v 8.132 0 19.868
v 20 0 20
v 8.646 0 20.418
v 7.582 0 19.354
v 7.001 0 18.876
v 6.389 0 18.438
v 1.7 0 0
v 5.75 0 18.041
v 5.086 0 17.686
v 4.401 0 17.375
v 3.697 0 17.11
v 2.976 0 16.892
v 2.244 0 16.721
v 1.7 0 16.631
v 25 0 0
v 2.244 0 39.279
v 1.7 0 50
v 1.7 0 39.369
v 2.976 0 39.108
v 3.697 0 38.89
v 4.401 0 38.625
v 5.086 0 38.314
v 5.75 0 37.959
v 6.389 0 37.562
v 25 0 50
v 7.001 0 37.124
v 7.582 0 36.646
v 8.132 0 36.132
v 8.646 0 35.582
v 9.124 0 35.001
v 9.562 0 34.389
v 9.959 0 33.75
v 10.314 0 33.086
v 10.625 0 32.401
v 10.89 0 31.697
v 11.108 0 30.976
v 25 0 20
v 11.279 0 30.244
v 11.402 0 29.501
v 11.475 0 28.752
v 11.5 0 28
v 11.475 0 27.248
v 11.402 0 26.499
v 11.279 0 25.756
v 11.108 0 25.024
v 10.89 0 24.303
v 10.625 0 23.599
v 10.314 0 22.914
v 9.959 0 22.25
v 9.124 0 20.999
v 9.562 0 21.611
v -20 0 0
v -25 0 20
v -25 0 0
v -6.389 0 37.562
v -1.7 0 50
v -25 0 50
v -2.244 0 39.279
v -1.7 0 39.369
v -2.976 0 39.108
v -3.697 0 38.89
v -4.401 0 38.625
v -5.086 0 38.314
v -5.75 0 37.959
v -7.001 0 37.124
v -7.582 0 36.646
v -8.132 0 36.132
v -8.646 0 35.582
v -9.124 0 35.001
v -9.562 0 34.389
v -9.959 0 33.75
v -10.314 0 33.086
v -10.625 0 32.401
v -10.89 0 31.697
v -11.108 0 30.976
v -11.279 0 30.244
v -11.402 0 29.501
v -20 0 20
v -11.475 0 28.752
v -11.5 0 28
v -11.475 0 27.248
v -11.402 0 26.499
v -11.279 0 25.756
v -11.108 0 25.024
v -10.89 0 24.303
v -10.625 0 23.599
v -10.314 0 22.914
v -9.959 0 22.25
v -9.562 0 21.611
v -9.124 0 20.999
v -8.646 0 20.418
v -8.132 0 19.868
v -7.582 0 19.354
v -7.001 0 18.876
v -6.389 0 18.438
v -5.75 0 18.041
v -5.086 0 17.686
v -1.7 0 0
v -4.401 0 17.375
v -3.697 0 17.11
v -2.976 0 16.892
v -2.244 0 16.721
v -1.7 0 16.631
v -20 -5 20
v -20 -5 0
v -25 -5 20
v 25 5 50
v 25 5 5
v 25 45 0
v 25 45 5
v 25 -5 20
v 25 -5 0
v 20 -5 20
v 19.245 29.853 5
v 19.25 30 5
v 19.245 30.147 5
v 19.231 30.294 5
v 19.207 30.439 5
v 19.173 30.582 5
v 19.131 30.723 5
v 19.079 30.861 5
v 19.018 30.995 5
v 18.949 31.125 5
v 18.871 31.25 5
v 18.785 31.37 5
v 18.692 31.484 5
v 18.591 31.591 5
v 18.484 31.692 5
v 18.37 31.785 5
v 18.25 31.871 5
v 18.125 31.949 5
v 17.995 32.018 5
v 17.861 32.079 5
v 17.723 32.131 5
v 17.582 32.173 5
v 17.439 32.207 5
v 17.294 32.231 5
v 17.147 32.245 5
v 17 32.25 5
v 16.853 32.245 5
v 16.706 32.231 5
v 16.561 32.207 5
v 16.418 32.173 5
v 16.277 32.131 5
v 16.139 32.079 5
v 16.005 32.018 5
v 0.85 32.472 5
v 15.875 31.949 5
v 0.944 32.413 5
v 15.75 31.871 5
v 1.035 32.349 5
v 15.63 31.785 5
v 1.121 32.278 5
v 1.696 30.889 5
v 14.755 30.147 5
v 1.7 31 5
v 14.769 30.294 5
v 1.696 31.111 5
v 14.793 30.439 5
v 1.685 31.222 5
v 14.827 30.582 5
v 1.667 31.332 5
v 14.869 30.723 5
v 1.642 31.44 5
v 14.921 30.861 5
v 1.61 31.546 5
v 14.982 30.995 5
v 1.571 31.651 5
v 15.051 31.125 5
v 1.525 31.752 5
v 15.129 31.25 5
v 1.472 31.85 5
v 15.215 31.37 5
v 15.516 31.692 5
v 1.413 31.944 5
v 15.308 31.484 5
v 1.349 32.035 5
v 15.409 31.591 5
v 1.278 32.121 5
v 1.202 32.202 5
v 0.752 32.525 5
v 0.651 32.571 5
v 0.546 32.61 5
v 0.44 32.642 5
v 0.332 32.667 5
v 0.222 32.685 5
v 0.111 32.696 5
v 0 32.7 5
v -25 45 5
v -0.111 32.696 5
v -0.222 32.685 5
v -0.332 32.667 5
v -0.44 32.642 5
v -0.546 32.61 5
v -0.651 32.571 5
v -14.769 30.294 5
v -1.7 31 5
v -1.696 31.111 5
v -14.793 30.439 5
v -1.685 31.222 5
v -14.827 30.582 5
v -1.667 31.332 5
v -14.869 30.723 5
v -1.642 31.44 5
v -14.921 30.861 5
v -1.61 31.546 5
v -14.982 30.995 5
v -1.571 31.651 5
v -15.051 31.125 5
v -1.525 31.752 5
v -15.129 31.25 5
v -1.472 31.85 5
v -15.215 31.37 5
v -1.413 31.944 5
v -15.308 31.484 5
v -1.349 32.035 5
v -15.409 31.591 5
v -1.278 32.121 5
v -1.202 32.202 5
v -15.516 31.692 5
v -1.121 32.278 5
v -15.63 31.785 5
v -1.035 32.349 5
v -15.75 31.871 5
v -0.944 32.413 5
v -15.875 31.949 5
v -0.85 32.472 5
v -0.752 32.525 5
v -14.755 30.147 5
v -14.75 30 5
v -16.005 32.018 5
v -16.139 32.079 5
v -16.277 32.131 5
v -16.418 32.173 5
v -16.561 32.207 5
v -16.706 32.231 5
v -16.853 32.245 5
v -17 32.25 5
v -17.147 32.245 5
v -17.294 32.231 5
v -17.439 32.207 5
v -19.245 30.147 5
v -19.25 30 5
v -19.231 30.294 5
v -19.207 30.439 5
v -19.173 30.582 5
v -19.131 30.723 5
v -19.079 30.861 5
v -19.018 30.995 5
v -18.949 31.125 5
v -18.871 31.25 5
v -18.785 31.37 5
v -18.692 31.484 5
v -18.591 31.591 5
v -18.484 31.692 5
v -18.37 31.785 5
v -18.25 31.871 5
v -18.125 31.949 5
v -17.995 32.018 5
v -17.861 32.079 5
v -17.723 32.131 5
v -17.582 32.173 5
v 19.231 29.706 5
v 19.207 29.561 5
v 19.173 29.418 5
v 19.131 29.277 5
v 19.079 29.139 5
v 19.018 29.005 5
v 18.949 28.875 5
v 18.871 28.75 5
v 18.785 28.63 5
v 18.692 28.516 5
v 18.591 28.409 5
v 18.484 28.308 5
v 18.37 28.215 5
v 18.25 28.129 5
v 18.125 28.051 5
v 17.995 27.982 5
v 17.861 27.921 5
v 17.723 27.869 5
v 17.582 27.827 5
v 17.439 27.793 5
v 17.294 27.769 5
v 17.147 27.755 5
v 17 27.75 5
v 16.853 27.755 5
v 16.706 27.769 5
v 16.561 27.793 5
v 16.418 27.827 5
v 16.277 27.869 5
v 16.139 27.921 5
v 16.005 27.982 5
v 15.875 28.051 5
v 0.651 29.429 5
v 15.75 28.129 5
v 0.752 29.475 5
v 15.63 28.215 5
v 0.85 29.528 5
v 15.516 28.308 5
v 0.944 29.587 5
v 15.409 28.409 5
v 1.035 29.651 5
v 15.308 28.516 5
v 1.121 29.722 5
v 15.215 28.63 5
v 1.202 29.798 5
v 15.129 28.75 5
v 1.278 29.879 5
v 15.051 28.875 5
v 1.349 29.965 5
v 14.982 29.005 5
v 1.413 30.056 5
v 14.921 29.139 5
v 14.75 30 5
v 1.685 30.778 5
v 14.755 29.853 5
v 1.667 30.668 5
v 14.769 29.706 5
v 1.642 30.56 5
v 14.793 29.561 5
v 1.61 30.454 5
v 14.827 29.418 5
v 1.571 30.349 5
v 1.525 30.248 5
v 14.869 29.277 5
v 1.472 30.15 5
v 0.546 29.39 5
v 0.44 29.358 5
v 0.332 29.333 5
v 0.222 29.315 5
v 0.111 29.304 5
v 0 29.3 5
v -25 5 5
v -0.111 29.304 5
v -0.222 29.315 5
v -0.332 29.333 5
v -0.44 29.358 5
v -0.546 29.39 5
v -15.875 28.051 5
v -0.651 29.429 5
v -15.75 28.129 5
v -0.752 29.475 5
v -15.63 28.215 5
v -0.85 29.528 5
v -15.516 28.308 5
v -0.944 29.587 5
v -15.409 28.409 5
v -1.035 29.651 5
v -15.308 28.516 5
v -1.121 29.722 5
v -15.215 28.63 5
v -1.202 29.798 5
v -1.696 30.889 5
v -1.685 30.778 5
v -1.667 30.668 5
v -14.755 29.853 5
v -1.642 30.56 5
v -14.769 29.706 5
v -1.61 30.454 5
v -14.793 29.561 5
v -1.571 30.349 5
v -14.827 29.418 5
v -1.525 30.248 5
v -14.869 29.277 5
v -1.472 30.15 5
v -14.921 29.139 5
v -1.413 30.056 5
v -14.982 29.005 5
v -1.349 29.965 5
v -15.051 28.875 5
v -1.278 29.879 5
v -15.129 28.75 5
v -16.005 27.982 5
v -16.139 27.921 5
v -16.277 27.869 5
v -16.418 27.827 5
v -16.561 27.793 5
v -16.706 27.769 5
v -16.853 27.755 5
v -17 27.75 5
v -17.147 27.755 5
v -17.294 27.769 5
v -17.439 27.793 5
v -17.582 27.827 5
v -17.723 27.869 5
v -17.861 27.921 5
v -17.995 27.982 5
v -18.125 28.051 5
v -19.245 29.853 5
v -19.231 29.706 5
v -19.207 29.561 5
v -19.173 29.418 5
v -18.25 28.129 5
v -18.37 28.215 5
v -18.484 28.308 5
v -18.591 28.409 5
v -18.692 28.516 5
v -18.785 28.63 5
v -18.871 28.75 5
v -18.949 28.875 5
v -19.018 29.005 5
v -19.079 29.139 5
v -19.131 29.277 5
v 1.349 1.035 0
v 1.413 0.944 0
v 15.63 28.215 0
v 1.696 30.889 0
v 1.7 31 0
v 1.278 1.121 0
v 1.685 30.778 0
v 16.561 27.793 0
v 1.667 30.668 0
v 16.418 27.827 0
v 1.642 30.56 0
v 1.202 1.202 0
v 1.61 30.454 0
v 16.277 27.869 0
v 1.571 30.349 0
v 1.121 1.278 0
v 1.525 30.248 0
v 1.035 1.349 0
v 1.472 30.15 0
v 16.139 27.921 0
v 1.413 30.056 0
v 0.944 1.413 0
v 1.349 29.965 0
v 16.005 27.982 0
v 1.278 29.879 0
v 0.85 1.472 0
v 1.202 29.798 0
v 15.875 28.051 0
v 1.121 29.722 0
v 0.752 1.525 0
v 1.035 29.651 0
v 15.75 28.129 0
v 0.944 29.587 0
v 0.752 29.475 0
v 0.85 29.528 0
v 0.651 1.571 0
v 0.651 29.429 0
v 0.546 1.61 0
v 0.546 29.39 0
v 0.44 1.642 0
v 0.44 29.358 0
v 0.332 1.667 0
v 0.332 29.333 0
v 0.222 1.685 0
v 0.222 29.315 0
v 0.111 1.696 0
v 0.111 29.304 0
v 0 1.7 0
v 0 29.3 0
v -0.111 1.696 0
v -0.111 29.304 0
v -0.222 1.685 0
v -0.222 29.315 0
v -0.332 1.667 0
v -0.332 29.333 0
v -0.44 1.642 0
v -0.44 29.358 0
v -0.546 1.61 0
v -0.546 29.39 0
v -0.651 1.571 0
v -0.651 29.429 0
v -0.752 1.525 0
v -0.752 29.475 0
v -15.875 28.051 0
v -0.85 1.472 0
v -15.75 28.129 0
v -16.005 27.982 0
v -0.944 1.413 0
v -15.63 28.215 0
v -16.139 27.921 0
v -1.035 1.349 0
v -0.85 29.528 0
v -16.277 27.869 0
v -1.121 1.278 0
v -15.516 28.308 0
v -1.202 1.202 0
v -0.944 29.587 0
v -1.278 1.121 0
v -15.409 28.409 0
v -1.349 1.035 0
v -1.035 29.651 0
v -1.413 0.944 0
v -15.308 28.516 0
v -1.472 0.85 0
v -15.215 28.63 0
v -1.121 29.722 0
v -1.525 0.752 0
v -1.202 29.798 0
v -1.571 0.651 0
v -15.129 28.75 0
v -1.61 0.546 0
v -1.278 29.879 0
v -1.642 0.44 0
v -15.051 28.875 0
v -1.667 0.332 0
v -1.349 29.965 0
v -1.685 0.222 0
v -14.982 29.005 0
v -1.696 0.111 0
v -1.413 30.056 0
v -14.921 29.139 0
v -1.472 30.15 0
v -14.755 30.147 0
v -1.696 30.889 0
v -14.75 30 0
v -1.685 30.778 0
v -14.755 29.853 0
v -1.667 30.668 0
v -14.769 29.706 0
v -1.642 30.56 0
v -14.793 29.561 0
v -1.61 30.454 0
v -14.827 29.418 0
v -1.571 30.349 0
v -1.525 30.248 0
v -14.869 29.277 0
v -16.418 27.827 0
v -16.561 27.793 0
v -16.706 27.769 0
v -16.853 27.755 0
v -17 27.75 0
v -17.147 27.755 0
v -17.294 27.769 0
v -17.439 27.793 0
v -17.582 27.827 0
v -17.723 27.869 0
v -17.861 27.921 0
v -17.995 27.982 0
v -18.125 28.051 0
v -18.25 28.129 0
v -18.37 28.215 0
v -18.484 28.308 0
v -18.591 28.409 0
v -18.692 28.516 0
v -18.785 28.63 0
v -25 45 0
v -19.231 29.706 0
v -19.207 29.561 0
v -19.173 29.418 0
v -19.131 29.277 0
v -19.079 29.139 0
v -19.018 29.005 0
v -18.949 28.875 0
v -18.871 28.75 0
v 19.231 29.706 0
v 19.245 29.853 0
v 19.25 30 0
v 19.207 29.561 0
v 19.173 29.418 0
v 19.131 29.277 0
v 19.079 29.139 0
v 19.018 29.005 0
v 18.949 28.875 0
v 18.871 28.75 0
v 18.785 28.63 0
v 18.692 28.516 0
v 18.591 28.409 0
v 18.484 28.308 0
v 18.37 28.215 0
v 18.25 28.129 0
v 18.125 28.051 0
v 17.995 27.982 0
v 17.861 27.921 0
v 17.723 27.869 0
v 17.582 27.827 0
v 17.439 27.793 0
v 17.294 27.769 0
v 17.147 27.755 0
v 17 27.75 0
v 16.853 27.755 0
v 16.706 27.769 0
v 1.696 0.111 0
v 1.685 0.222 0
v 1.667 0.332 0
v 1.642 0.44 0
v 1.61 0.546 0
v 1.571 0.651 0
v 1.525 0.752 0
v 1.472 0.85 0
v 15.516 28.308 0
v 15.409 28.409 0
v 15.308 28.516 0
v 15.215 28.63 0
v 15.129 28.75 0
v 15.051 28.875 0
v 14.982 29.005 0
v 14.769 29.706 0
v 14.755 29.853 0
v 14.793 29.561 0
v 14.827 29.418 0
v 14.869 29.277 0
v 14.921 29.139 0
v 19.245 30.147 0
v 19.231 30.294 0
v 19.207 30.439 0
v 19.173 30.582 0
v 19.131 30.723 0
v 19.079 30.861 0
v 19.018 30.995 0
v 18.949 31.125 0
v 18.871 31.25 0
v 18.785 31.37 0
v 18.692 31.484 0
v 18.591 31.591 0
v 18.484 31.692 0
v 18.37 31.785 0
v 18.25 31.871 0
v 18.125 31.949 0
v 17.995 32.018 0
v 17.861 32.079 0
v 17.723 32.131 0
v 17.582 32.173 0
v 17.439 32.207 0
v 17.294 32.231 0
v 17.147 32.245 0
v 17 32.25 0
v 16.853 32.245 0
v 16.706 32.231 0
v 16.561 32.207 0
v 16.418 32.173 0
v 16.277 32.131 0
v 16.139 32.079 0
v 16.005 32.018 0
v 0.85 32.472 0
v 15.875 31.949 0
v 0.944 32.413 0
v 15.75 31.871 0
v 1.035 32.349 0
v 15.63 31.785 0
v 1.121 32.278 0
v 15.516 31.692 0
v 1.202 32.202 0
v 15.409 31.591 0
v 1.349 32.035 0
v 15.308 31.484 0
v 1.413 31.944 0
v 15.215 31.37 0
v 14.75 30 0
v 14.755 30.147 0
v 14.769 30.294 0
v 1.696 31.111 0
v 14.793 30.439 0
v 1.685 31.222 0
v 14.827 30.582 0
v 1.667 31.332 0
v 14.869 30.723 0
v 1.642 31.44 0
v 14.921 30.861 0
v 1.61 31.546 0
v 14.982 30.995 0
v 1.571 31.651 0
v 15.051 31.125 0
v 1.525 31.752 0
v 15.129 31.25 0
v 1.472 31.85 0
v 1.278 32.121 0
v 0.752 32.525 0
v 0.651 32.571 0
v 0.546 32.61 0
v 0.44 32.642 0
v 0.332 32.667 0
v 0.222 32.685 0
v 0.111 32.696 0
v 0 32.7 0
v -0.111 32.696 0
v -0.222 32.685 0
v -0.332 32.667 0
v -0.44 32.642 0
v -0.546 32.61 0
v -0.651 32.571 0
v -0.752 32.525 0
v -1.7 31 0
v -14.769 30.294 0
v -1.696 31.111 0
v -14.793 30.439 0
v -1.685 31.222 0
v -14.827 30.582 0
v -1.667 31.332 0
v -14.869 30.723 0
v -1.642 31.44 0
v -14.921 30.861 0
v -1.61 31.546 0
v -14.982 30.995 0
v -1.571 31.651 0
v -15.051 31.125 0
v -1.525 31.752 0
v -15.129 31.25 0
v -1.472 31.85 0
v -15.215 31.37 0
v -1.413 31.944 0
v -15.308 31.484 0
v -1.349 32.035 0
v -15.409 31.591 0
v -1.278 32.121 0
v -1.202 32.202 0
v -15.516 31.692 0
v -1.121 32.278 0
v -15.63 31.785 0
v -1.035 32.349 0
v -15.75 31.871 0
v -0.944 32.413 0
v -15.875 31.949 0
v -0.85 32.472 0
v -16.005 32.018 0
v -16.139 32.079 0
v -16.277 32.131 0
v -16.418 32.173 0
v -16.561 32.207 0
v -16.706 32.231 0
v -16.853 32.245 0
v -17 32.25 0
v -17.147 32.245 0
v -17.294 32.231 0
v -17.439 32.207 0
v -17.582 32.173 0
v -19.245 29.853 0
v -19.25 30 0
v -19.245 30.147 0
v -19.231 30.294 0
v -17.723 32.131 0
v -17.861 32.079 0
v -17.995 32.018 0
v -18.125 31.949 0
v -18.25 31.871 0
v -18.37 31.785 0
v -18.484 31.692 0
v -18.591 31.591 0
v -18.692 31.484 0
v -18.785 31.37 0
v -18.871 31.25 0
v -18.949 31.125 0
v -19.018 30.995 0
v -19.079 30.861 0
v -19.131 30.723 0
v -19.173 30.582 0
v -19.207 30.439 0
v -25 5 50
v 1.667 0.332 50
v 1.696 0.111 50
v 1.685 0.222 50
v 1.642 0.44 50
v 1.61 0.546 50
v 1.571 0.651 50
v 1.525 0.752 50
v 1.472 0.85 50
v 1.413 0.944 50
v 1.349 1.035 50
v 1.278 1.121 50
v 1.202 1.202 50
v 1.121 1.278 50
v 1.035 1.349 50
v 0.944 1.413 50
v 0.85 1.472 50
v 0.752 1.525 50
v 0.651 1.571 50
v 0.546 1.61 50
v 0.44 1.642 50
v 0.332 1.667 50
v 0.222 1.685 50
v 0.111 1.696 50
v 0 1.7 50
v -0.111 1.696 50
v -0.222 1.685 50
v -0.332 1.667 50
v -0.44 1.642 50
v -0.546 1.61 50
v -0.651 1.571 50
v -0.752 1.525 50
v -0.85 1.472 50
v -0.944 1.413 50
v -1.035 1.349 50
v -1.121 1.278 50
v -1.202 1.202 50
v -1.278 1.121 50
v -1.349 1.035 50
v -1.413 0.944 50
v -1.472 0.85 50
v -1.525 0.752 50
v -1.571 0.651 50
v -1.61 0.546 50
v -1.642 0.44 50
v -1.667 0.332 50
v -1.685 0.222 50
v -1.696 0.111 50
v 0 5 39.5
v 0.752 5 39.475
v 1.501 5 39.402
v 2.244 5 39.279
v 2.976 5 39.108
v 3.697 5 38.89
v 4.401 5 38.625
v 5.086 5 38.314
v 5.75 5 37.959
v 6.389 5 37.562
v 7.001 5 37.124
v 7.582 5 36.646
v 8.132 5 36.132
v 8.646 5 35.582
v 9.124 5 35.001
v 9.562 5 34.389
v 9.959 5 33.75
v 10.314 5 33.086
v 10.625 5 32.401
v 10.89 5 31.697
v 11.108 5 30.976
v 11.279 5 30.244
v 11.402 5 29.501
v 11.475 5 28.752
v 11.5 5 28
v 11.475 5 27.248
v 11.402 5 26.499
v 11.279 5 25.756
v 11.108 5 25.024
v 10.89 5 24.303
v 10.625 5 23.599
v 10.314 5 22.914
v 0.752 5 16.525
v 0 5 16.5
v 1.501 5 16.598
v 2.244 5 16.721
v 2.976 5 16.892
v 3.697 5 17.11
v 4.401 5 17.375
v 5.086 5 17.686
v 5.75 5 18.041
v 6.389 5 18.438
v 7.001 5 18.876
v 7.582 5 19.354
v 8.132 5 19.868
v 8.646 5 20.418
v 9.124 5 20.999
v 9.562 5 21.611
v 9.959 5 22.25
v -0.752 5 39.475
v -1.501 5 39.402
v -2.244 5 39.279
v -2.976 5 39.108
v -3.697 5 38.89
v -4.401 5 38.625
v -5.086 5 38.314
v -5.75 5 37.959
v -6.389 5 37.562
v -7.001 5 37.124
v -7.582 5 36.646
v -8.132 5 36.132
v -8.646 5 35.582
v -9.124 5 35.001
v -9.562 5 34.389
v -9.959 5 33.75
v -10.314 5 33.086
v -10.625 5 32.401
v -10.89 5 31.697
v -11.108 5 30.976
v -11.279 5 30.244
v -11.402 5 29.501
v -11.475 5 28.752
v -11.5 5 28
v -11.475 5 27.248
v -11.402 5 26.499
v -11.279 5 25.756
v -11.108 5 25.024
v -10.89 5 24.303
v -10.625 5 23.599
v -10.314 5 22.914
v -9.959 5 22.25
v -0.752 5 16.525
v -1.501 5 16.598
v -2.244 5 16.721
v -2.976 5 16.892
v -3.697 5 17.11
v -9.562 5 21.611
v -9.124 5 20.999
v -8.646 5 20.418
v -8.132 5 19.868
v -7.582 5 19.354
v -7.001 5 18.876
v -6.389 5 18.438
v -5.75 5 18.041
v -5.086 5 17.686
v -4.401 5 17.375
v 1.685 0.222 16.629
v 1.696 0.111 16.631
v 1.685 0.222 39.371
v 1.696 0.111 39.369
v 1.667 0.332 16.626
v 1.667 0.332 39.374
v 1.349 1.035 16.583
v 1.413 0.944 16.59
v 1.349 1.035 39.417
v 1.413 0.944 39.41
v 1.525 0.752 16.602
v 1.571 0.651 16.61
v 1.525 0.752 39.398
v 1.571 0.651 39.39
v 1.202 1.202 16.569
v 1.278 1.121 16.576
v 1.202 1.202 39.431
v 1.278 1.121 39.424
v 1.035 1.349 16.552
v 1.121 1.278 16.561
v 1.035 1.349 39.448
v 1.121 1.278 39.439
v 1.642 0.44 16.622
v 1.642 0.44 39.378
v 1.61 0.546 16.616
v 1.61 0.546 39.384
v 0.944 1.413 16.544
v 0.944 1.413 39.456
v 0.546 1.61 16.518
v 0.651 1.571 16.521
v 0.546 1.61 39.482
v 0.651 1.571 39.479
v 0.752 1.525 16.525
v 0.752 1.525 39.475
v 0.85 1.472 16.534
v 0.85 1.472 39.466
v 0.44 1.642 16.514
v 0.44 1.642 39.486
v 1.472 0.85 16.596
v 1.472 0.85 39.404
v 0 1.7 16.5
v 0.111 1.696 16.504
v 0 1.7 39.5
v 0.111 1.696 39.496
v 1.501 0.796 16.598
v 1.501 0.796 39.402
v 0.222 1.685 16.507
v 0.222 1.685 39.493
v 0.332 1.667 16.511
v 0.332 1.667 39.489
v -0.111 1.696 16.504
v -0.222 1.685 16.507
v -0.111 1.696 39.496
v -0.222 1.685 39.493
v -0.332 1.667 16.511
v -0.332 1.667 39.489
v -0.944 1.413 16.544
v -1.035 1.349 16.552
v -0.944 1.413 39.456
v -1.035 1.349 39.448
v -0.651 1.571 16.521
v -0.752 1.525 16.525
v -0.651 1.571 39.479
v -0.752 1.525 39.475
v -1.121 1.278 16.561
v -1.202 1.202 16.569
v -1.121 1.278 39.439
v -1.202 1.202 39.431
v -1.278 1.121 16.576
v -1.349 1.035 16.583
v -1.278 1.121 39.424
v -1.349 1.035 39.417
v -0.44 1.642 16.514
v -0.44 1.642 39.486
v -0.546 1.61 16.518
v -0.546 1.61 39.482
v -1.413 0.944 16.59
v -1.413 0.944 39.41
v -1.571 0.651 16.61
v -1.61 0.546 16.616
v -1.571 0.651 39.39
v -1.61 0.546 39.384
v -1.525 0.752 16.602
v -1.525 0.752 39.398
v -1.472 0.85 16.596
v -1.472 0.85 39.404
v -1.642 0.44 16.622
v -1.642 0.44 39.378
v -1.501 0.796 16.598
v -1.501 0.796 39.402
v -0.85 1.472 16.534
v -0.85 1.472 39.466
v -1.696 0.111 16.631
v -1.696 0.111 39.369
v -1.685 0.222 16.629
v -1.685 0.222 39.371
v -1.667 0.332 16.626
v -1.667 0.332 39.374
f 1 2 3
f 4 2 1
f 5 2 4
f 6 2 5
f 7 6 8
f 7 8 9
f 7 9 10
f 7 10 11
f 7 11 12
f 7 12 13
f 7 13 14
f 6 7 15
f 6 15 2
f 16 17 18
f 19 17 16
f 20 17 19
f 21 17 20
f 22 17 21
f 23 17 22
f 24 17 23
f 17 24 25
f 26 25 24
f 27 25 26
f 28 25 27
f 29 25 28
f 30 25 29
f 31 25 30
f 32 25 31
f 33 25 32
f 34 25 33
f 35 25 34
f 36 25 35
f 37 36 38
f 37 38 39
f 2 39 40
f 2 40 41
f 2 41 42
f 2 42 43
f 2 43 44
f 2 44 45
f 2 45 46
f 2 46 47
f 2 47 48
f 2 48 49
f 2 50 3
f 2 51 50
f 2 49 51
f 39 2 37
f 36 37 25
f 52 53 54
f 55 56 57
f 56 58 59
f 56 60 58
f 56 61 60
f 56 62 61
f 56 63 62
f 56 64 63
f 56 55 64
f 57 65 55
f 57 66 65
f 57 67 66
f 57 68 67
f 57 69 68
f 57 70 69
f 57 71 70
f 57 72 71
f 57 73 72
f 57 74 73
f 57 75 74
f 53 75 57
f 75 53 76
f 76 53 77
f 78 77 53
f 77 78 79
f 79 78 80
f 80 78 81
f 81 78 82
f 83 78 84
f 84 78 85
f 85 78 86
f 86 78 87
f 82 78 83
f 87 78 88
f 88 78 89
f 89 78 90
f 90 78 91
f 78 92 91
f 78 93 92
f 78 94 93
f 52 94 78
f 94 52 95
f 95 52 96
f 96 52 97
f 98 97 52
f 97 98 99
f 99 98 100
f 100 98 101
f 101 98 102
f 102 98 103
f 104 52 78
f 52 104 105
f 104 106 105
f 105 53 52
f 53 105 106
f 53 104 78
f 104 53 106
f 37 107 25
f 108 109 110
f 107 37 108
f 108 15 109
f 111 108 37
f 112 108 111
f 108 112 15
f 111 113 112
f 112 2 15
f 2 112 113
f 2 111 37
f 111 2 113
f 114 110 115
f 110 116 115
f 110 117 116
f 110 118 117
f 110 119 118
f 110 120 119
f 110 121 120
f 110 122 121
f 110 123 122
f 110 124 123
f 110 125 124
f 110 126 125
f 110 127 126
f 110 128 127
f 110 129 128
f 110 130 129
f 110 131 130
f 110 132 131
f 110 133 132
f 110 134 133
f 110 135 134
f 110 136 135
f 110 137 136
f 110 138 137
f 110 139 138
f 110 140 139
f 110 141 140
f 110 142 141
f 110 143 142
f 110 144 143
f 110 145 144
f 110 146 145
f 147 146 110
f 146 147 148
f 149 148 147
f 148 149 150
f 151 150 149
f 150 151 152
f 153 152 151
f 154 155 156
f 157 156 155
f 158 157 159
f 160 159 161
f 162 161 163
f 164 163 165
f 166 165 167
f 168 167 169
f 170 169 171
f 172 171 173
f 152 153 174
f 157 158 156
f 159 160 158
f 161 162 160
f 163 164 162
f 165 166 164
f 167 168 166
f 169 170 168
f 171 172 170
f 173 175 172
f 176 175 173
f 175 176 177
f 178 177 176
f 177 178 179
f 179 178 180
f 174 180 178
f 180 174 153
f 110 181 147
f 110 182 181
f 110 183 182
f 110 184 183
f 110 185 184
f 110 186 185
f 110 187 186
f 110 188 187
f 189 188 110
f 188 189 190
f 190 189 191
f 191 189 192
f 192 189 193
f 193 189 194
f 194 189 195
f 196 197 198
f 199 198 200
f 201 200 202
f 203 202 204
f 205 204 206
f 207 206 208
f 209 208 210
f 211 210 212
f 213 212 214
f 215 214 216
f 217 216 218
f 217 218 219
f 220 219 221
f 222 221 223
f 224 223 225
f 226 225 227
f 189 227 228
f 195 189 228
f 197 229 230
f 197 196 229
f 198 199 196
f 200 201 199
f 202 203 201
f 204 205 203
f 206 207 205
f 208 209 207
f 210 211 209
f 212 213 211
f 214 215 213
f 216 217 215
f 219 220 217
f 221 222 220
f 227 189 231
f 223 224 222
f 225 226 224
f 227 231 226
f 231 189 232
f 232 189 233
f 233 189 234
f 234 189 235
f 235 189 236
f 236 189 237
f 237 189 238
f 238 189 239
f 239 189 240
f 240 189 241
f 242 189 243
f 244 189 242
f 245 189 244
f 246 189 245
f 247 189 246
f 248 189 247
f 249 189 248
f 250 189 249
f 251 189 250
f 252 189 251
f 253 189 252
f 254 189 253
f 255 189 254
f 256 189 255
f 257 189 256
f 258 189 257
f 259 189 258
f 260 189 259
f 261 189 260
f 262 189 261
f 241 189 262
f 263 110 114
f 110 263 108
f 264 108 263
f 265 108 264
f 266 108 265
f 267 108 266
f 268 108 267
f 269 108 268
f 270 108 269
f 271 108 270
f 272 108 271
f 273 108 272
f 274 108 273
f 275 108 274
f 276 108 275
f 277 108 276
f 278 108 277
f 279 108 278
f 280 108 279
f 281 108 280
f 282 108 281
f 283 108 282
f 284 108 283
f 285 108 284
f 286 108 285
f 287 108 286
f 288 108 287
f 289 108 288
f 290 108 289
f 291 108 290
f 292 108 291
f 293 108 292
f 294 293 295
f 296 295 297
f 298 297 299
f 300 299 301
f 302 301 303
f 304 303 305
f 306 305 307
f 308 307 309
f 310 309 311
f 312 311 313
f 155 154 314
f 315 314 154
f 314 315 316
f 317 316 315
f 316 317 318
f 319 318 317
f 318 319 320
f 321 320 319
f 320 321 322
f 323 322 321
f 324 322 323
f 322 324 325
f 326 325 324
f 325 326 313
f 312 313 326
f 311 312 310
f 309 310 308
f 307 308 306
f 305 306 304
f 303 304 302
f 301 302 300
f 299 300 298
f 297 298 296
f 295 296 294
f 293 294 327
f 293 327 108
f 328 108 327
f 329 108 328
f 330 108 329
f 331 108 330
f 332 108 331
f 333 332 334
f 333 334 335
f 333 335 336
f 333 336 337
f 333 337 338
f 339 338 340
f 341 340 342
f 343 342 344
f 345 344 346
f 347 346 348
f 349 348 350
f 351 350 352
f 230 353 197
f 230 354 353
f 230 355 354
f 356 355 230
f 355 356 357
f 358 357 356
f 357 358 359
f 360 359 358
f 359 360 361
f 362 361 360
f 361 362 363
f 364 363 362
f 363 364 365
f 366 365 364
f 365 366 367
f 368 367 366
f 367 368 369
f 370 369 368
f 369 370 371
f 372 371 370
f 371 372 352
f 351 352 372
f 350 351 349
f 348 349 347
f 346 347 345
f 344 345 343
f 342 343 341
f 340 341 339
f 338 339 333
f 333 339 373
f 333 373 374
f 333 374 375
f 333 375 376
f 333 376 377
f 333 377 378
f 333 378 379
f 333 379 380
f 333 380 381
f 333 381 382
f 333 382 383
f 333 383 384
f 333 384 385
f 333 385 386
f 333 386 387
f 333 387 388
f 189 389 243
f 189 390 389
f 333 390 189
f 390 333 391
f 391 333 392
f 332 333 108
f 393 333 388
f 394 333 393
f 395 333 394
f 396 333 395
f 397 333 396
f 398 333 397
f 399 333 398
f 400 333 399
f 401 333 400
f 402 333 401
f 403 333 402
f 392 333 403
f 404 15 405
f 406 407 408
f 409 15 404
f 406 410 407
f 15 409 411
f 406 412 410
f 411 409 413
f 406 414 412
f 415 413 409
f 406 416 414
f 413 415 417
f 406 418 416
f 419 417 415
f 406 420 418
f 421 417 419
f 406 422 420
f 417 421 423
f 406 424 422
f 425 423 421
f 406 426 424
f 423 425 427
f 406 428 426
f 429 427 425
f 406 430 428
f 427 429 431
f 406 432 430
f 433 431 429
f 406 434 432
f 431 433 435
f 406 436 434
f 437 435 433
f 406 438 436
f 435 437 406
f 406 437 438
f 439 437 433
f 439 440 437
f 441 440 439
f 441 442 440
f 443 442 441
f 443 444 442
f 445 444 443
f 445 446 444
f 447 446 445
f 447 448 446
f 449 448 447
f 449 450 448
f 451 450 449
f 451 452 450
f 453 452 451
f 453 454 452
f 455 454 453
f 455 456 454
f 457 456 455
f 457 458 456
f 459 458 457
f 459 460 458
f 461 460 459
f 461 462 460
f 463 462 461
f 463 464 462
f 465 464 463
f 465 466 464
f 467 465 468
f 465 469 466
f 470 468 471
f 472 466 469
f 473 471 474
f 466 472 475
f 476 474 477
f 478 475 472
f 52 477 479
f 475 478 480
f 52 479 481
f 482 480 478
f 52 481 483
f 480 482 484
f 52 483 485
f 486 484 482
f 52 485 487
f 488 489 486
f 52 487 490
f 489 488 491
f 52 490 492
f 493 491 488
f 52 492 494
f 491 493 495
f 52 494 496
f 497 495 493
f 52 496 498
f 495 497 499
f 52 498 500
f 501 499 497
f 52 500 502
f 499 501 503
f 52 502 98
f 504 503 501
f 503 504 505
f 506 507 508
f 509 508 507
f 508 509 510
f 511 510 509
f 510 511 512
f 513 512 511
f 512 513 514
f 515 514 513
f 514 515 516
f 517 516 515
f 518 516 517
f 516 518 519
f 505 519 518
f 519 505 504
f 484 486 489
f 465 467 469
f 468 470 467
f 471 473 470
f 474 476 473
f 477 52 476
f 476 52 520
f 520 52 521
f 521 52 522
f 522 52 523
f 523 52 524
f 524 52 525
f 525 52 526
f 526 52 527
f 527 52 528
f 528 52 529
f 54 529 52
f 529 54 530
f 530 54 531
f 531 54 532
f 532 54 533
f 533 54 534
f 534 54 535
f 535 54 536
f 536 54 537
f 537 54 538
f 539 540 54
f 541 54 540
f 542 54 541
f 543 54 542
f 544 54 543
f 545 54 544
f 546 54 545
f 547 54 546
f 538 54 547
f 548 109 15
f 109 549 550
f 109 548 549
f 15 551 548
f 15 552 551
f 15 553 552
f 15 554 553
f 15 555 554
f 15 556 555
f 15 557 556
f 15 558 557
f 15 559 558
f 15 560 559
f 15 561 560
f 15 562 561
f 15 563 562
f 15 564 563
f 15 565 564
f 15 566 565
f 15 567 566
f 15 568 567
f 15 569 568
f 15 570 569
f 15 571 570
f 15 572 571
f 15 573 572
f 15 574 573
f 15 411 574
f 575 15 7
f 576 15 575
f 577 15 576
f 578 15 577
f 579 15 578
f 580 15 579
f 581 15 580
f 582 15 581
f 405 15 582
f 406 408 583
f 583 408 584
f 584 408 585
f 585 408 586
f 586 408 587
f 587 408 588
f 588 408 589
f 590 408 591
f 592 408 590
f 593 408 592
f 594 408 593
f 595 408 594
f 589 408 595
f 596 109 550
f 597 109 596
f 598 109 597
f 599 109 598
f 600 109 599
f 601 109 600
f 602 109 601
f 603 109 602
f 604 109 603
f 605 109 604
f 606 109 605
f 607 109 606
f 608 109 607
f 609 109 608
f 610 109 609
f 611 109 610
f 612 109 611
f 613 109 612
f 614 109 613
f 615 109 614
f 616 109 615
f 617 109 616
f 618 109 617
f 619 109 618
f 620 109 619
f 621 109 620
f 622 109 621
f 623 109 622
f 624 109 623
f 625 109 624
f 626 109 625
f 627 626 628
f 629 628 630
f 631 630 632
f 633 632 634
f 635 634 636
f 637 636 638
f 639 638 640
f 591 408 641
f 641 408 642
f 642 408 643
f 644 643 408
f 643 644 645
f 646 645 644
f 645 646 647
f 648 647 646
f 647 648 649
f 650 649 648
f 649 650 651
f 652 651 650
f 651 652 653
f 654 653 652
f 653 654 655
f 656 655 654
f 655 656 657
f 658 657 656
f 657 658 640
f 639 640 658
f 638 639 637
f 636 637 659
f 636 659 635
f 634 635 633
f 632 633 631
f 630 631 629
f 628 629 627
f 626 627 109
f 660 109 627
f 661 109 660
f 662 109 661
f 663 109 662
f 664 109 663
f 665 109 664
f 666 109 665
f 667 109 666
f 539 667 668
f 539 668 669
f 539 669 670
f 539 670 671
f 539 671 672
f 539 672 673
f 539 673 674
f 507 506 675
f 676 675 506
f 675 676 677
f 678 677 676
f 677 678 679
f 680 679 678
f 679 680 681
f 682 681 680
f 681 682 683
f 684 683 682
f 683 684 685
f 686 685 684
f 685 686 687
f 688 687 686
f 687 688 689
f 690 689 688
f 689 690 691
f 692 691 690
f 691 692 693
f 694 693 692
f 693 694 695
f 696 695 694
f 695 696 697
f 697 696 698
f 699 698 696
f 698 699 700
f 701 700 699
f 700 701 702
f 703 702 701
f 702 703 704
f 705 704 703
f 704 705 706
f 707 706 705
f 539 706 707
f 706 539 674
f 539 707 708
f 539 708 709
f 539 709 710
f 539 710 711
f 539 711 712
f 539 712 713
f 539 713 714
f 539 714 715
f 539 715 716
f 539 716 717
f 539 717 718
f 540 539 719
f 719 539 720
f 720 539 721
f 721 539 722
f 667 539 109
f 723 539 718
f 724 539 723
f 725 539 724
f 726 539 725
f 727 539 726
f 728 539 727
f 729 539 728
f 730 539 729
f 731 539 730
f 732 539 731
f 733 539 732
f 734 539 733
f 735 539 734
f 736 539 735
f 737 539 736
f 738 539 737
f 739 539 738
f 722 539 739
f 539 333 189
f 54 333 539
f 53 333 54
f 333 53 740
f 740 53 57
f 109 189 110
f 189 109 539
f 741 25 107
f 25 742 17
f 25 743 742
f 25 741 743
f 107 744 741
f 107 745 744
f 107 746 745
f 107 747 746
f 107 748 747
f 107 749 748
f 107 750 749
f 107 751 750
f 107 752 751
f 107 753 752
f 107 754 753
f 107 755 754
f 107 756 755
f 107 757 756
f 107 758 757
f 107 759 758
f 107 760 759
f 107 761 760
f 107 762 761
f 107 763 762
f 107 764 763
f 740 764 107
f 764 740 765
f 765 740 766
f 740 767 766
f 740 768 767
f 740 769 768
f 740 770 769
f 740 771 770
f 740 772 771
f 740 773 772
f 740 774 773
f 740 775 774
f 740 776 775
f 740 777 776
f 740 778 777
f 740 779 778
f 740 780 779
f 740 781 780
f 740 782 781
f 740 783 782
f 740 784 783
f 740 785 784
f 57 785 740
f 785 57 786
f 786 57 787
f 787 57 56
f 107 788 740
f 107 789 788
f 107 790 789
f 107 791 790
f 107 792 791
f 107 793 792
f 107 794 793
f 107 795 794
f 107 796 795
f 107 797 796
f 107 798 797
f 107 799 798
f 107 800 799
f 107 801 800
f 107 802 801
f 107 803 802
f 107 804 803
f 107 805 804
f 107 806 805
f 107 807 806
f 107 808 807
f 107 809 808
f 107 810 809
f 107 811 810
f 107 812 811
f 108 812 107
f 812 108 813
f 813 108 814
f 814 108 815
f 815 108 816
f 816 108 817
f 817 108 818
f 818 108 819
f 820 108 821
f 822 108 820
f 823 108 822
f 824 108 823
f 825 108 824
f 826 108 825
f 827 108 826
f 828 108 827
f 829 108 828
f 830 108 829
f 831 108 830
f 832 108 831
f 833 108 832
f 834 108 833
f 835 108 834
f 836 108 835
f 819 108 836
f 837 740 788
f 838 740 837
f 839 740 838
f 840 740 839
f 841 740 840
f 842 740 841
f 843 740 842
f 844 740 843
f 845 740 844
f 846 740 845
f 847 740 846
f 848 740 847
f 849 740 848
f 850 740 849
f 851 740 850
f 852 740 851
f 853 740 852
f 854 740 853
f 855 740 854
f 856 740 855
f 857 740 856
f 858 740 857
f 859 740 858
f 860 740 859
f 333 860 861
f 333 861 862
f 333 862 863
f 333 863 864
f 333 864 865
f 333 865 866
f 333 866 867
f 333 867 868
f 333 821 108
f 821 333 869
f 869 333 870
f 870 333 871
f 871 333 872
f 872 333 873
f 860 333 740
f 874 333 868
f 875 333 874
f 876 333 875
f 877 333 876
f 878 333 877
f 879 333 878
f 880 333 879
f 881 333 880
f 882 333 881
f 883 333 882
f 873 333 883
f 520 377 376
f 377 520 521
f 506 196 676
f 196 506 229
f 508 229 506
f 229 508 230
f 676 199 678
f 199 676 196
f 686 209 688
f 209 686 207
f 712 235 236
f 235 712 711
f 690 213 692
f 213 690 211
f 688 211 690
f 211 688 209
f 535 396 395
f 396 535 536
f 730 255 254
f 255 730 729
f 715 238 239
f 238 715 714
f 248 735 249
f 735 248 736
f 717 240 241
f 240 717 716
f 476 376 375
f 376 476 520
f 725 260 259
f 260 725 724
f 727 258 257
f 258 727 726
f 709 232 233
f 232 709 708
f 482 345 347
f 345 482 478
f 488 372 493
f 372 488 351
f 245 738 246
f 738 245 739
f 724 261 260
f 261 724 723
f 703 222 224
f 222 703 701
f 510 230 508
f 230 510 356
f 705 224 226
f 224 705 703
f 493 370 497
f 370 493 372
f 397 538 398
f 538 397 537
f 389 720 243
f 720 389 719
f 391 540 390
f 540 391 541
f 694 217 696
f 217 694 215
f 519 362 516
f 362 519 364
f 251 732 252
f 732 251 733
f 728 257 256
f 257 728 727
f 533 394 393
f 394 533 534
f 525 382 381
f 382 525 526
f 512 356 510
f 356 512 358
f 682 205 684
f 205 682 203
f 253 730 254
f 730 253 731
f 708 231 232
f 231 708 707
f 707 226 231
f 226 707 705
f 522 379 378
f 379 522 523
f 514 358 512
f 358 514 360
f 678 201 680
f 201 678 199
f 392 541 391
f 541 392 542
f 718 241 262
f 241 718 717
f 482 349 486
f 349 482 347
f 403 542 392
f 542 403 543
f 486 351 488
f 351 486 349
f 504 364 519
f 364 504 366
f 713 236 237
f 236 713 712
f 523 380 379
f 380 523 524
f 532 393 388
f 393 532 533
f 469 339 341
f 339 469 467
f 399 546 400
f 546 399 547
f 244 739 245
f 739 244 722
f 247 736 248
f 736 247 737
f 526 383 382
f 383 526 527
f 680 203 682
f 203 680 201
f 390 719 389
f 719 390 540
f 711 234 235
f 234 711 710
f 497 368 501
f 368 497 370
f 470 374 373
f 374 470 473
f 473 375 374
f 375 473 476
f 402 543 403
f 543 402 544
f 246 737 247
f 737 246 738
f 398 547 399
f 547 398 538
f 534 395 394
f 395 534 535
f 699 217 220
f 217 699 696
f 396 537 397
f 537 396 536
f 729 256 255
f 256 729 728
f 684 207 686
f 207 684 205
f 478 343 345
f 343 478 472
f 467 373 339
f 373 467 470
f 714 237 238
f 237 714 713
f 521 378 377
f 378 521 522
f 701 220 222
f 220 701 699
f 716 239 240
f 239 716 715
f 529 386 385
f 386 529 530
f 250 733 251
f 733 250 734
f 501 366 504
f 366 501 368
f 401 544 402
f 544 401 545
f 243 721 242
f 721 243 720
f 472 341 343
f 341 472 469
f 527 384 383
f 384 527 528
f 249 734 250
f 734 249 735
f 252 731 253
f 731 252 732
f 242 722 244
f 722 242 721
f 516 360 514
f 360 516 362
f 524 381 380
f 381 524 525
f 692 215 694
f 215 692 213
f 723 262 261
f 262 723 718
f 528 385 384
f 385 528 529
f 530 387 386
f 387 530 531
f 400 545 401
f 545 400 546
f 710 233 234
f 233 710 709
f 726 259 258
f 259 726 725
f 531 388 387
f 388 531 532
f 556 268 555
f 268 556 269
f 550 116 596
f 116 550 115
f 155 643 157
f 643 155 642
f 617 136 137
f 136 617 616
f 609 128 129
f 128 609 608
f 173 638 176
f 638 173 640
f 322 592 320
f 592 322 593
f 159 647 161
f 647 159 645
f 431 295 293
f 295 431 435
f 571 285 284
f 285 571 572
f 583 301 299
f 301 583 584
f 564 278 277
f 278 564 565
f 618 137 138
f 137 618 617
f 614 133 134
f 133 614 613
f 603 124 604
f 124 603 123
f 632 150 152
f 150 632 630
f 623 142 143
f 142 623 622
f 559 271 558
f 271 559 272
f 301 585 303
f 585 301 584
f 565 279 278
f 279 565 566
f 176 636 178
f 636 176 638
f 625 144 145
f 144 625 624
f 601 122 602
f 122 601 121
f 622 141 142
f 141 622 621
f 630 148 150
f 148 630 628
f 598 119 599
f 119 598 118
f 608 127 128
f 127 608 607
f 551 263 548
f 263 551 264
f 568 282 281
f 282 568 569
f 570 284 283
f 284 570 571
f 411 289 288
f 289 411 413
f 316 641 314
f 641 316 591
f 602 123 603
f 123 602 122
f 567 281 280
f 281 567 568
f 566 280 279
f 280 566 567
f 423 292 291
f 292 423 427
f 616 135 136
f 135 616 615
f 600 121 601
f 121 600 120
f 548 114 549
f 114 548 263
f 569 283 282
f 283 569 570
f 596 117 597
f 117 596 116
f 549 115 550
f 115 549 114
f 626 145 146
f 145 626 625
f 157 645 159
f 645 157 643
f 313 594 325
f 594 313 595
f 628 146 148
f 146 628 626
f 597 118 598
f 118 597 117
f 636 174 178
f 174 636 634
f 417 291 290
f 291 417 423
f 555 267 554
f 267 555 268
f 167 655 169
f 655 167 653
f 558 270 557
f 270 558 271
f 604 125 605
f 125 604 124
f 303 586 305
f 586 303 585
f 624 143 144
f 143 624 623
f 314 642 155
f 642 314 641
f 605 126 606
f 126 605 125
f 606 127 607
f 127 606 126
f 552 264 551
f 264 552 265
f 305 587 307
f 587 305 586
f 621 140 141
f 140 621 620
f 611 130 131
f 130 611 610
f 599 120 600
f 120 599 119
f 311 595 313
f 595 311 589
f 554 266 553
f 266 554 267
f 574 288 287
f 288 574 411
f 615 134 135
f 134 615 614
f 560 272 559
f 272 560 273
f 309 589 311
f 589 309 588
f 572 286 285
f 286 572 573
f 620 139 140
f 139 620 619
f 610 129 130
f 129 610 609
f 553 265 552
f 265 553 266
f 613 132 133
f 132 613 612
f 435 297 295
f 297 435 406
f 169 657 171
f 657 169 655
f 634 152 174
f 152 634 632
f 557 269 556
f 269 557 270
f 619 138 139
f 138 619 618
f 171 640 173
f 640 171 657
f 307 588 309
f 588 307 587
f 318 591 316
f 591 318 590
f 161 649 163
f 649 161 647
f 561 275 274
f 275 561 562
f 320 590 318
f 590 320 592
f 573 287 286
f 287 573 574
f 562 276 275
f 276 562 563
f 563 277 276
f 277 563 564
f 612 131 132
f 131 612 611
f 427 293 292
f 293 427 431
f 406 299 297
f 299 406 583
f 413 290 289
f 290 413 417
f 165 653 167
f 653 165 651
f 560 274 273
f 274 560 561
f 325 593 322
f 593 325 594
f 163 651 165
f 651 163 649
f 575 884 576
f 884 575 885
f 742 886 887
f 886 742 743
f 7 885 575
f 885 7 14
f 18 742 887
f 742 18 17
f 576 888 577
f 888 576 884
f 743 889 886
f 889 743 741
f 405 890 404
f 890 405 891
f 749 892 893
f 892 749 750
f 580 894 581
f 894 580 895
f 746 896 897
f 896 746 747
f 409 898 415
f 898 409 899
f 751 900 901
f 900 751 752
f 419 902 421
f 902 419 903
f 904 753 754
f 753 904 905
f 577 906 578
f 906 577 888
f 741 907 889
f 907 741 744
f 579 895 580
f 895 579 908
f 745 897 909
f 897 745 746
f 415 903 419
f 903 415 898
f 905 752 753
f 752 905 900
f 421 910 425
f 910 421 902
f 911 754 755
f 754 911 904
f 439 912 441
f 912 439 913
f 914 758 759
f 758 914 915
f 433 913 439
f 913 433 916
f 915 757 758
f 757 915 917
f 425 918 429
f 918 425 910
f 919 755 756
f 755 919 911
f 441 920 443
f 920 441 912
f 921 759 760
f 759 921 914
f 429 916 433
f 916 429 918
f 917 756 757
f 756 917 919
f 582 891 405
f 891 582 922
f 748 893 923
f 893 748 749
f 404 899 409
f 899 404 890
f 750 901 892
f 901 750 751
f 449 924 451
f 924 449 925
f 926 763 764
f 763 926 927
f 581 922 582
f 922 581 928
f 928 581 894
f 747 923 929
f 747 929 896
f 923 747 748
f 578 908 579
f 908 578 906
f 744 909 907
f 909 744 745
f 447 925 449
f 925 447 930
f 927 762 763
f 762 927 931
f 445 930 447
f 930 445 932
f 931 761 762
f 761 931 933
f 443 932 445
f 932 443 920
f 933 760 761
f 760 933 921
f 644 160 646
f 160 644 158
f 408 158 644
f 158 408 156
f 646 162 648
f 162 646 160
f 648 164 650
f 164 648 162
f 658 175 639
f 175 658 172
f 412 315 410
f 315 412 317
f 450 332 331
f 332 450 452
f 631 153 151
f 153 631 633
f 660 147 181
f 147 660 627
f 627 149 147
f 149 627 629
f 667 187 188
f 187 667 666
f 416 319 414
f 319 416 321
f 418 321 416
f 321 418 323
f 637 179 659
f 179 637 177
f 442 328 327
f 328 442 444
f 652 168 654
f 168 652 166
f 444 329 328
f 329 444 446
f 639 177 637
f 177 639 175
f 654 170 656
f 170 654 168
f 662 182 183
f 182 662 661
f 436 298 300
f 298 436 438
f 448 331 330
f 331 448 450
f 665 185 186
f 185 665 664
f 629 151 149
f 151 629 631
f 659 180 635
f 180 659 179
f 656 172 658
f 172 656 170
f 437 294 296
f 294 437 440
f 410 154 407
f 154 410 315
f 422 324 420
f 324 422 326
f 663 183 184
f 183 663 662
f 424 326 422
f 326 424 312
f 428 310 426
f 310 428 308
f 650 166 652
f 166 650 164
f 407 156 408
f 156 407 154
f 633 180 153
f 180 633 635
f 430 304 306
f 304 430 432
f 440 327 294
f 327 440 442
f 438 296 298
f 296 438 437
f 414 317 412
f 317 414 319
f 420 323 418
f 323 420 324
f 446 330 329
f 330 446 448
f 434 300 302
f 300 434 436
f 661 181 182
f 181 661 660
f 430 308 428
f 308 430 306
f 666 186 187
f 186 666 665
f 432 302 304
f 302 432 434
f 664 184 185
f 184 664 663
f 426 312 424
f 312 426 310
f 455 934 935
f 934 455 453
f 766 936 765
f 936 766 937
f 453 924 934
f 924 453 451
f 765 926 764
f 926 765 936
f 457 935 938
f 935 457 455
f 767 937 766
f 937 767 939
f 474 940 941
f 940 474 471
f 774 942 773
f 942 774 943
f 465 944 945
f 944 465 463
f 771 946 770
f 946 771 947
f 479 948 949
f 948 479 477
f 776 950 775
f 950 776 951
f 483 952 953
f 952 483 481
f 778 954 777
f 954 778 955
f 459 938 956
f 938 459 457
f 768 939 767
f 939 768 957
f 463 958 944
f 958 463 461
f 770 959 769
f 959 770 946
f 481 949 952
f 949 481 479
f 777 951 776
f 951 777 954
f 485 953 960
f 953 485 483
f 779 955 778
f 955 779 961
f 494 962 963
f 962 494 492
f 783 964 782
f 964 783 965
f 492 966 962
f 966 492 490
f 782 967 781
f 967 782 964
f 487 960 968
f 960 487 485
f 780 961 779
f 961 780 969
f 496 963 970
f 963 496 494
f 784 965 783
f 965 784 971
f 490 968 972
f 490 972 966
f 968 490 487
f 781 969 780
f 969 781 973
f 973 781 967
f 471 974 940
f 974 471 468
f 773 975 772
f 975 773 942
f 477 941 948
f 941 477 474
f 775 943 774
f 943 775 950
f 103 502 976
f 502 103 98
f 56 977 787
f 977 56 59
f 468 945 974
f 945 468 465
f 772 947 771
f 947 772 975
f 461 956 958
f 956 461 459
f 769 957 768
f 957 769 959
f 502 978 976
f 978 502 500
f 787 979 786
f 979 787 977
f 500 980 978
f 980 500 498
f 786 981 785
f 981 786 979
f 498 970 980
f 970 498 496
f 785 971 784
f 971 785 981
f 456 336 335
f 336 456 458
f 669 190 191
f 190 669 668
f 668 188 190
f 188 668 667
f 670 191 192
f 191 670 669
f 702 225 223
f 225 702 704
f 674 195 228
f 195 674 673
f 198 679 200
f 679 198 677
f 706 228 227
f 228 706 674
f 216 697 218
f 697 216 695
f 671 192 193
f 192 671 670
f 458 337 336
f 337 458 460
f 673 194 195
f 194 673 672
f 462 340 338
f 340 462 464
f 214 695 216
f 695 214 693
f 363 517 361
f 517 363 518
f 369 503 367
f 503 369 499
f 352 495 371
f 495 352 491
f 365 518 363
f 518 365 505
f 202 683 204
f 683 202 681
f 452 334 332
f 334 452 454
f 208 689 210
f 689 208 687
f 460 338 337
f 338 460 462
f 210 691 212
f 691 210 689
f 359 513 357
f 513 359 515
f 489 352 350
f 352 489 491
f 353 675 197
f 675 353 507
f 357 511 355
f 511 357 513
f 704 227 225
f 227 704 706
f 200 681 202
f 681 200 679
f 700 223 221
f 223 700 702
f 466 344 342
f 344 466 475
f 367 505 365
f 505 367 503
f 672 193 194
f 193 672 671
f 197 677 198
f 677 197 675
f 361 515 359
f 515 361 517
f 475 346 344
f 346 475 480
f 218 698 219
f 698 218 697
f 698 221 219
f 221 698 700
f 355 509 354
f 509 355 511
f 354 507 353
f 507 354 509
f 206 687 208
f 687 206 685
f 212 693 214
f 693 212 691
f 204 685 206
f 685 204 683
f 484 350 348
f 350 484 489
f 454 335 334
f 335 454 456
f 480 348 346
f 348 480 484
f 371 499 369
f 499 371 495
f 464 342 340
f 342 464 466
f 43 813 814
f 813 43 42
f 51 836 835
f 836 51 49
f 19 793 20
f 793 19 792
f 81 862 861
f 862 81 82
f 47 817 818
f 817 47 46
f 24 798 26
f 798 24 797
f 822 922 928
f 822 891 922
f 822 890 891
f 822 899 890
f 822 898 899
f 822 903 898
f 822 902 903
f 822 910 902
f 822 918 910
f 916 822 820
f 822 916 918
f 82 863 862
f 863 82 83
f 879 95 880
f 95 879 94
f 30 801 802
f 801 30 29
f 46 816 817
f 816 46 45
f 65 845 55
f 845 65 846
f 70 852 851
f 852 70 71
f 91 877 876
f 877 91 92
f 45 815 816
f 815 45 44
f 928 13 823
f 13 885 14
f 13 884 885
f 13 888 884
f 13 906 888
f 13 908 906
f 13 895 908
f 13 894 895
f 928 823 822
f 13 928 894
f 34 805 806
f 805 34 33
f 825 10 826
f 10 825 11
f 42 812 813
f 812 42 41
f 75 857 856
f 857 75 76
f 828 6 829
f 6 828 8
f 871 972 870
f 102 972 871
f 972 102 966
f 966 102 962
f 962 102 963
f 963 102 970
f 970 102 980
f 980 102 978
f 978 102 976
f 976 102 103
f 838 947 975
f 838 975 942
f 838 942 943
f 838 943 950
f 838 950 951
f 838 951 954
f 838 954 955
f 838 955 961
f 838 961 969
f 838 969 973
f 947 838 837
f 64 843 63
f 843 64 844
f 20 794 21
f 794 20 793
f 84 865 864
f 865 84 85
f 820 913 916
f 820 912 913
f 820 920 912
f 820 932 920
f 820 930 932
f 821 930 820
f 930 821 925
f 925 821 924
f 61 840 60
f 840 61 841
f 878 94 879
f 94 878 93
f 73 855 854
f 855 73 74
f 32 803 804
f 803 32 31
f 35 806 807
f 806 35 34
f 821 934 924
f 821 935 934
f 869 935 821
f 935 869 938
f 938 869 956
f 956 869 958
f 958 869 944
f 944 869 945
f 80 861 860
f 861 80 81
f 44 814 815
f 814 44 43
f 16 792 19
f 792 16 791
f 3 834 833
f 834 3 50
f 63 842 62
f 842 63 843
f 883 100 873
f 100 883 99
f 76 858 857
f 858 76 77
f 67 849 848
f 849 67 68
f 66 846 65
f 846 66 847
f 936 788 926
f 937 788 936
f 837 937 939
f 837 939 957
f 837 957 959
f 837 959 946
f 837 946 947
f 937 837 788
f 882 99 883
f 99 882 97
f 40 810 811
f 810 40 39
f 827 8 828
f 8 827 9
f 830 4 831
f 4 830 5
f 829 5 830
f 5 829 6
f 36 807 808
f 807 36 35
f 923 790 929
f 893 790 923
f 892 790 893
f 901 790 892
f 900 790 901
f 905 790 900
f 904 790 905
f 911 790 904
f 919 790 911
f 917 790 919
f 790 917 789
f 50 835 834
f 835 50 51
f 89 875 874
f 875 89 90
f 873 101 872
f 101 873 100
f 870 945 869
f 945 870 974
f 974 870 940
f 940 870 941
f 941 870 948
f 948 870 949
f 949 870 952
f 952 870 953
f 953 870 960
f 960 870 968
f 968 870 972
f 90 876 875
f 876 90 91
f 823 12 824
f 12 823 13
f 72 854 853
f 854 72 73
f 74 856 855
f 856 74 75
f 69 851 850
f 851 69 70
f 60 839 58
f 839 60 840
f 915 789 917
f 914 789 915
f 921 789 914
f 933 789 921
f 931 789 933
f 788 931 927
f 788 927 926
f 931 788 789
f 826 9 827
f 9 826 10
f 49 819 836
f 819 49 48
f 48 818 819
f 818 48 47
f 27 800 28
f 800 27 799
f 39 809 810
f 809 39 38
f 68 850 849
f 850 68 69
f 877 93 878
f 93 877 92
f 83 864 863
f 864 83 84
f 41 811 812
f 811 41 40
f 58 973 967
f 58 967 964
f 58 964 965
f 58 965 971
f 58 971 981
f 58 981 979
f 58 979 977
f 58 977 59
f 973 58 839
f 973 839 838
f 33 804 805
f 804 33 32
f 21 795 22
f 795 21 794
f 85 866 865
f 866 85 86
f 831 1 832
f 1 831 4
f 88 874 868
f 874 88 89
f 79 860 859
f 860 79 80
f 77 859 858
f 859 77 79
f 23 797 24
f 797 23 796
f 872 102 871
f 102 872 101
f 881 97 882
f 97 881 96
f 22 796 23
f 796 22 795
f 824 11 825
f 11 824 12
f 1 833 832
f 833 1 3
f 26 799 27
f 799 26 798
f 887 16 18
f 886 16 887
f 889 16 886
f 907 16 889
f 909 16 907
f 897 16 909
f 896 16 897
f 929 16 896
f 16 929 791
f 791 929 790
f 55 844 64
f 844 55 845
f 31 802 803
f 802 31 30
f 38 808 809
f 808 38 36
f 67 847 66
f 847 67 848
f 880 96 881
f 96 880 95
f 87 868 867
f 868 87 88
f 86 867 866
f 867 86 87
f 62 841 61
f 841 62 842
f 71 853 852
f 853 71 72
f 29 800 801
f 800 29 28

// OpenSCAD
// L-shaped mounting bracket for NEMA 17 stepper motor (syringe pump)
// Print orientation: base plate on bed, vertical plate builds upward (+Z)

// ---------------- Parameters ----------------
plate_w      = 50;    // base plate length (X)
plate_h      = 45;    // base plate width (Y)
plate_t      = 5;     // base plate thickness (Z)

hole_x       = 17;    // M4 through-hole X offset (plus/minus)
hole_y       = 30;    // M4 through-hole Y position
hole_d       = 4.5;   // M4 through-hole diameter

plate_v_w    = 50;    // vertical motor plate length (X)
plate_v_h    = 5;     // vertical motor plate width (Y)
plate_v_z    = 50;    // vertical motor plate height (Z)

boss_d       = 23;    // motor centring boss hole diameter
boss_x       = 0;     // boss hole X centre
boss_z       = 28;    // boss hole Z centre

screw_d      = 3.4;   // M3 screw hole diameter
screw_pitch  = 31;    // square pattern side length

gusset_t     = 5;     // gusset thickness (X)
gusset_leg   = 20;    // right-triangle leg length (Y and Z)

eps          = 0.5;   // cutter overshoot past faces
$fn          = 96;    // curve resolution

// ---------------- Model ----------------
difference() {
    union() {
        // Base plate
        translate([-plate_w/2, 0, 0])
            cube([plate_w, plate_h, plate_t]);

        // Vertical motor plate (overlaps base plate for a solid union)
        translate([-plate_v_w/2, 0, 0])
            cube([plate_v_w, plate_v_h, plate_v_z]);

        // Gussets: right triangles in YZ, flush with outer X edges
        for (sx = [-1, 1])
            translate([sx > 0 ? plate_v_w/2 - gusset_t : -plate_v_w/2, 0, 0])
                rotate([90, 0, 0])
                    linear_extrude(height = gusset_t)
                        polygon(points = [
                            [gusset_t, gusset_leg],
                            [gusset_t, 0],
                            [0, gusset_leg]
                        ]);
    }

    // M4 through-holes in base plate
    for (ox = [-hole_x, hole_x])
        translate([ox, hole_y, -eps])
            cylinder(d = hole_d, h = plate_t + 2*eps);

    // Motor boss hole through vertical plate (along Y)
    translate([boss_x, -eps, boss_z])
        rotate([-90, 0, 0])
            cylinder(d = boss_d, h = plate_v_h + 2*eps);

    // M3 screw holes on square pattern around boss hole
    for (a = [0, 90, 180, 270])
        rotate([0, 0, a])
            translate([screw_pitch/2, screw_pitch/2, 0])
                for (dx = [-screw_pitch/2, screw_pitch/2])
                    for (dy = [-screw_pitch/2, screw_pitch/2])
                        translate([dx, dy, -eps])
                            cylinder(d = screw_d, h = plate_v_z + 2*eps);
}
